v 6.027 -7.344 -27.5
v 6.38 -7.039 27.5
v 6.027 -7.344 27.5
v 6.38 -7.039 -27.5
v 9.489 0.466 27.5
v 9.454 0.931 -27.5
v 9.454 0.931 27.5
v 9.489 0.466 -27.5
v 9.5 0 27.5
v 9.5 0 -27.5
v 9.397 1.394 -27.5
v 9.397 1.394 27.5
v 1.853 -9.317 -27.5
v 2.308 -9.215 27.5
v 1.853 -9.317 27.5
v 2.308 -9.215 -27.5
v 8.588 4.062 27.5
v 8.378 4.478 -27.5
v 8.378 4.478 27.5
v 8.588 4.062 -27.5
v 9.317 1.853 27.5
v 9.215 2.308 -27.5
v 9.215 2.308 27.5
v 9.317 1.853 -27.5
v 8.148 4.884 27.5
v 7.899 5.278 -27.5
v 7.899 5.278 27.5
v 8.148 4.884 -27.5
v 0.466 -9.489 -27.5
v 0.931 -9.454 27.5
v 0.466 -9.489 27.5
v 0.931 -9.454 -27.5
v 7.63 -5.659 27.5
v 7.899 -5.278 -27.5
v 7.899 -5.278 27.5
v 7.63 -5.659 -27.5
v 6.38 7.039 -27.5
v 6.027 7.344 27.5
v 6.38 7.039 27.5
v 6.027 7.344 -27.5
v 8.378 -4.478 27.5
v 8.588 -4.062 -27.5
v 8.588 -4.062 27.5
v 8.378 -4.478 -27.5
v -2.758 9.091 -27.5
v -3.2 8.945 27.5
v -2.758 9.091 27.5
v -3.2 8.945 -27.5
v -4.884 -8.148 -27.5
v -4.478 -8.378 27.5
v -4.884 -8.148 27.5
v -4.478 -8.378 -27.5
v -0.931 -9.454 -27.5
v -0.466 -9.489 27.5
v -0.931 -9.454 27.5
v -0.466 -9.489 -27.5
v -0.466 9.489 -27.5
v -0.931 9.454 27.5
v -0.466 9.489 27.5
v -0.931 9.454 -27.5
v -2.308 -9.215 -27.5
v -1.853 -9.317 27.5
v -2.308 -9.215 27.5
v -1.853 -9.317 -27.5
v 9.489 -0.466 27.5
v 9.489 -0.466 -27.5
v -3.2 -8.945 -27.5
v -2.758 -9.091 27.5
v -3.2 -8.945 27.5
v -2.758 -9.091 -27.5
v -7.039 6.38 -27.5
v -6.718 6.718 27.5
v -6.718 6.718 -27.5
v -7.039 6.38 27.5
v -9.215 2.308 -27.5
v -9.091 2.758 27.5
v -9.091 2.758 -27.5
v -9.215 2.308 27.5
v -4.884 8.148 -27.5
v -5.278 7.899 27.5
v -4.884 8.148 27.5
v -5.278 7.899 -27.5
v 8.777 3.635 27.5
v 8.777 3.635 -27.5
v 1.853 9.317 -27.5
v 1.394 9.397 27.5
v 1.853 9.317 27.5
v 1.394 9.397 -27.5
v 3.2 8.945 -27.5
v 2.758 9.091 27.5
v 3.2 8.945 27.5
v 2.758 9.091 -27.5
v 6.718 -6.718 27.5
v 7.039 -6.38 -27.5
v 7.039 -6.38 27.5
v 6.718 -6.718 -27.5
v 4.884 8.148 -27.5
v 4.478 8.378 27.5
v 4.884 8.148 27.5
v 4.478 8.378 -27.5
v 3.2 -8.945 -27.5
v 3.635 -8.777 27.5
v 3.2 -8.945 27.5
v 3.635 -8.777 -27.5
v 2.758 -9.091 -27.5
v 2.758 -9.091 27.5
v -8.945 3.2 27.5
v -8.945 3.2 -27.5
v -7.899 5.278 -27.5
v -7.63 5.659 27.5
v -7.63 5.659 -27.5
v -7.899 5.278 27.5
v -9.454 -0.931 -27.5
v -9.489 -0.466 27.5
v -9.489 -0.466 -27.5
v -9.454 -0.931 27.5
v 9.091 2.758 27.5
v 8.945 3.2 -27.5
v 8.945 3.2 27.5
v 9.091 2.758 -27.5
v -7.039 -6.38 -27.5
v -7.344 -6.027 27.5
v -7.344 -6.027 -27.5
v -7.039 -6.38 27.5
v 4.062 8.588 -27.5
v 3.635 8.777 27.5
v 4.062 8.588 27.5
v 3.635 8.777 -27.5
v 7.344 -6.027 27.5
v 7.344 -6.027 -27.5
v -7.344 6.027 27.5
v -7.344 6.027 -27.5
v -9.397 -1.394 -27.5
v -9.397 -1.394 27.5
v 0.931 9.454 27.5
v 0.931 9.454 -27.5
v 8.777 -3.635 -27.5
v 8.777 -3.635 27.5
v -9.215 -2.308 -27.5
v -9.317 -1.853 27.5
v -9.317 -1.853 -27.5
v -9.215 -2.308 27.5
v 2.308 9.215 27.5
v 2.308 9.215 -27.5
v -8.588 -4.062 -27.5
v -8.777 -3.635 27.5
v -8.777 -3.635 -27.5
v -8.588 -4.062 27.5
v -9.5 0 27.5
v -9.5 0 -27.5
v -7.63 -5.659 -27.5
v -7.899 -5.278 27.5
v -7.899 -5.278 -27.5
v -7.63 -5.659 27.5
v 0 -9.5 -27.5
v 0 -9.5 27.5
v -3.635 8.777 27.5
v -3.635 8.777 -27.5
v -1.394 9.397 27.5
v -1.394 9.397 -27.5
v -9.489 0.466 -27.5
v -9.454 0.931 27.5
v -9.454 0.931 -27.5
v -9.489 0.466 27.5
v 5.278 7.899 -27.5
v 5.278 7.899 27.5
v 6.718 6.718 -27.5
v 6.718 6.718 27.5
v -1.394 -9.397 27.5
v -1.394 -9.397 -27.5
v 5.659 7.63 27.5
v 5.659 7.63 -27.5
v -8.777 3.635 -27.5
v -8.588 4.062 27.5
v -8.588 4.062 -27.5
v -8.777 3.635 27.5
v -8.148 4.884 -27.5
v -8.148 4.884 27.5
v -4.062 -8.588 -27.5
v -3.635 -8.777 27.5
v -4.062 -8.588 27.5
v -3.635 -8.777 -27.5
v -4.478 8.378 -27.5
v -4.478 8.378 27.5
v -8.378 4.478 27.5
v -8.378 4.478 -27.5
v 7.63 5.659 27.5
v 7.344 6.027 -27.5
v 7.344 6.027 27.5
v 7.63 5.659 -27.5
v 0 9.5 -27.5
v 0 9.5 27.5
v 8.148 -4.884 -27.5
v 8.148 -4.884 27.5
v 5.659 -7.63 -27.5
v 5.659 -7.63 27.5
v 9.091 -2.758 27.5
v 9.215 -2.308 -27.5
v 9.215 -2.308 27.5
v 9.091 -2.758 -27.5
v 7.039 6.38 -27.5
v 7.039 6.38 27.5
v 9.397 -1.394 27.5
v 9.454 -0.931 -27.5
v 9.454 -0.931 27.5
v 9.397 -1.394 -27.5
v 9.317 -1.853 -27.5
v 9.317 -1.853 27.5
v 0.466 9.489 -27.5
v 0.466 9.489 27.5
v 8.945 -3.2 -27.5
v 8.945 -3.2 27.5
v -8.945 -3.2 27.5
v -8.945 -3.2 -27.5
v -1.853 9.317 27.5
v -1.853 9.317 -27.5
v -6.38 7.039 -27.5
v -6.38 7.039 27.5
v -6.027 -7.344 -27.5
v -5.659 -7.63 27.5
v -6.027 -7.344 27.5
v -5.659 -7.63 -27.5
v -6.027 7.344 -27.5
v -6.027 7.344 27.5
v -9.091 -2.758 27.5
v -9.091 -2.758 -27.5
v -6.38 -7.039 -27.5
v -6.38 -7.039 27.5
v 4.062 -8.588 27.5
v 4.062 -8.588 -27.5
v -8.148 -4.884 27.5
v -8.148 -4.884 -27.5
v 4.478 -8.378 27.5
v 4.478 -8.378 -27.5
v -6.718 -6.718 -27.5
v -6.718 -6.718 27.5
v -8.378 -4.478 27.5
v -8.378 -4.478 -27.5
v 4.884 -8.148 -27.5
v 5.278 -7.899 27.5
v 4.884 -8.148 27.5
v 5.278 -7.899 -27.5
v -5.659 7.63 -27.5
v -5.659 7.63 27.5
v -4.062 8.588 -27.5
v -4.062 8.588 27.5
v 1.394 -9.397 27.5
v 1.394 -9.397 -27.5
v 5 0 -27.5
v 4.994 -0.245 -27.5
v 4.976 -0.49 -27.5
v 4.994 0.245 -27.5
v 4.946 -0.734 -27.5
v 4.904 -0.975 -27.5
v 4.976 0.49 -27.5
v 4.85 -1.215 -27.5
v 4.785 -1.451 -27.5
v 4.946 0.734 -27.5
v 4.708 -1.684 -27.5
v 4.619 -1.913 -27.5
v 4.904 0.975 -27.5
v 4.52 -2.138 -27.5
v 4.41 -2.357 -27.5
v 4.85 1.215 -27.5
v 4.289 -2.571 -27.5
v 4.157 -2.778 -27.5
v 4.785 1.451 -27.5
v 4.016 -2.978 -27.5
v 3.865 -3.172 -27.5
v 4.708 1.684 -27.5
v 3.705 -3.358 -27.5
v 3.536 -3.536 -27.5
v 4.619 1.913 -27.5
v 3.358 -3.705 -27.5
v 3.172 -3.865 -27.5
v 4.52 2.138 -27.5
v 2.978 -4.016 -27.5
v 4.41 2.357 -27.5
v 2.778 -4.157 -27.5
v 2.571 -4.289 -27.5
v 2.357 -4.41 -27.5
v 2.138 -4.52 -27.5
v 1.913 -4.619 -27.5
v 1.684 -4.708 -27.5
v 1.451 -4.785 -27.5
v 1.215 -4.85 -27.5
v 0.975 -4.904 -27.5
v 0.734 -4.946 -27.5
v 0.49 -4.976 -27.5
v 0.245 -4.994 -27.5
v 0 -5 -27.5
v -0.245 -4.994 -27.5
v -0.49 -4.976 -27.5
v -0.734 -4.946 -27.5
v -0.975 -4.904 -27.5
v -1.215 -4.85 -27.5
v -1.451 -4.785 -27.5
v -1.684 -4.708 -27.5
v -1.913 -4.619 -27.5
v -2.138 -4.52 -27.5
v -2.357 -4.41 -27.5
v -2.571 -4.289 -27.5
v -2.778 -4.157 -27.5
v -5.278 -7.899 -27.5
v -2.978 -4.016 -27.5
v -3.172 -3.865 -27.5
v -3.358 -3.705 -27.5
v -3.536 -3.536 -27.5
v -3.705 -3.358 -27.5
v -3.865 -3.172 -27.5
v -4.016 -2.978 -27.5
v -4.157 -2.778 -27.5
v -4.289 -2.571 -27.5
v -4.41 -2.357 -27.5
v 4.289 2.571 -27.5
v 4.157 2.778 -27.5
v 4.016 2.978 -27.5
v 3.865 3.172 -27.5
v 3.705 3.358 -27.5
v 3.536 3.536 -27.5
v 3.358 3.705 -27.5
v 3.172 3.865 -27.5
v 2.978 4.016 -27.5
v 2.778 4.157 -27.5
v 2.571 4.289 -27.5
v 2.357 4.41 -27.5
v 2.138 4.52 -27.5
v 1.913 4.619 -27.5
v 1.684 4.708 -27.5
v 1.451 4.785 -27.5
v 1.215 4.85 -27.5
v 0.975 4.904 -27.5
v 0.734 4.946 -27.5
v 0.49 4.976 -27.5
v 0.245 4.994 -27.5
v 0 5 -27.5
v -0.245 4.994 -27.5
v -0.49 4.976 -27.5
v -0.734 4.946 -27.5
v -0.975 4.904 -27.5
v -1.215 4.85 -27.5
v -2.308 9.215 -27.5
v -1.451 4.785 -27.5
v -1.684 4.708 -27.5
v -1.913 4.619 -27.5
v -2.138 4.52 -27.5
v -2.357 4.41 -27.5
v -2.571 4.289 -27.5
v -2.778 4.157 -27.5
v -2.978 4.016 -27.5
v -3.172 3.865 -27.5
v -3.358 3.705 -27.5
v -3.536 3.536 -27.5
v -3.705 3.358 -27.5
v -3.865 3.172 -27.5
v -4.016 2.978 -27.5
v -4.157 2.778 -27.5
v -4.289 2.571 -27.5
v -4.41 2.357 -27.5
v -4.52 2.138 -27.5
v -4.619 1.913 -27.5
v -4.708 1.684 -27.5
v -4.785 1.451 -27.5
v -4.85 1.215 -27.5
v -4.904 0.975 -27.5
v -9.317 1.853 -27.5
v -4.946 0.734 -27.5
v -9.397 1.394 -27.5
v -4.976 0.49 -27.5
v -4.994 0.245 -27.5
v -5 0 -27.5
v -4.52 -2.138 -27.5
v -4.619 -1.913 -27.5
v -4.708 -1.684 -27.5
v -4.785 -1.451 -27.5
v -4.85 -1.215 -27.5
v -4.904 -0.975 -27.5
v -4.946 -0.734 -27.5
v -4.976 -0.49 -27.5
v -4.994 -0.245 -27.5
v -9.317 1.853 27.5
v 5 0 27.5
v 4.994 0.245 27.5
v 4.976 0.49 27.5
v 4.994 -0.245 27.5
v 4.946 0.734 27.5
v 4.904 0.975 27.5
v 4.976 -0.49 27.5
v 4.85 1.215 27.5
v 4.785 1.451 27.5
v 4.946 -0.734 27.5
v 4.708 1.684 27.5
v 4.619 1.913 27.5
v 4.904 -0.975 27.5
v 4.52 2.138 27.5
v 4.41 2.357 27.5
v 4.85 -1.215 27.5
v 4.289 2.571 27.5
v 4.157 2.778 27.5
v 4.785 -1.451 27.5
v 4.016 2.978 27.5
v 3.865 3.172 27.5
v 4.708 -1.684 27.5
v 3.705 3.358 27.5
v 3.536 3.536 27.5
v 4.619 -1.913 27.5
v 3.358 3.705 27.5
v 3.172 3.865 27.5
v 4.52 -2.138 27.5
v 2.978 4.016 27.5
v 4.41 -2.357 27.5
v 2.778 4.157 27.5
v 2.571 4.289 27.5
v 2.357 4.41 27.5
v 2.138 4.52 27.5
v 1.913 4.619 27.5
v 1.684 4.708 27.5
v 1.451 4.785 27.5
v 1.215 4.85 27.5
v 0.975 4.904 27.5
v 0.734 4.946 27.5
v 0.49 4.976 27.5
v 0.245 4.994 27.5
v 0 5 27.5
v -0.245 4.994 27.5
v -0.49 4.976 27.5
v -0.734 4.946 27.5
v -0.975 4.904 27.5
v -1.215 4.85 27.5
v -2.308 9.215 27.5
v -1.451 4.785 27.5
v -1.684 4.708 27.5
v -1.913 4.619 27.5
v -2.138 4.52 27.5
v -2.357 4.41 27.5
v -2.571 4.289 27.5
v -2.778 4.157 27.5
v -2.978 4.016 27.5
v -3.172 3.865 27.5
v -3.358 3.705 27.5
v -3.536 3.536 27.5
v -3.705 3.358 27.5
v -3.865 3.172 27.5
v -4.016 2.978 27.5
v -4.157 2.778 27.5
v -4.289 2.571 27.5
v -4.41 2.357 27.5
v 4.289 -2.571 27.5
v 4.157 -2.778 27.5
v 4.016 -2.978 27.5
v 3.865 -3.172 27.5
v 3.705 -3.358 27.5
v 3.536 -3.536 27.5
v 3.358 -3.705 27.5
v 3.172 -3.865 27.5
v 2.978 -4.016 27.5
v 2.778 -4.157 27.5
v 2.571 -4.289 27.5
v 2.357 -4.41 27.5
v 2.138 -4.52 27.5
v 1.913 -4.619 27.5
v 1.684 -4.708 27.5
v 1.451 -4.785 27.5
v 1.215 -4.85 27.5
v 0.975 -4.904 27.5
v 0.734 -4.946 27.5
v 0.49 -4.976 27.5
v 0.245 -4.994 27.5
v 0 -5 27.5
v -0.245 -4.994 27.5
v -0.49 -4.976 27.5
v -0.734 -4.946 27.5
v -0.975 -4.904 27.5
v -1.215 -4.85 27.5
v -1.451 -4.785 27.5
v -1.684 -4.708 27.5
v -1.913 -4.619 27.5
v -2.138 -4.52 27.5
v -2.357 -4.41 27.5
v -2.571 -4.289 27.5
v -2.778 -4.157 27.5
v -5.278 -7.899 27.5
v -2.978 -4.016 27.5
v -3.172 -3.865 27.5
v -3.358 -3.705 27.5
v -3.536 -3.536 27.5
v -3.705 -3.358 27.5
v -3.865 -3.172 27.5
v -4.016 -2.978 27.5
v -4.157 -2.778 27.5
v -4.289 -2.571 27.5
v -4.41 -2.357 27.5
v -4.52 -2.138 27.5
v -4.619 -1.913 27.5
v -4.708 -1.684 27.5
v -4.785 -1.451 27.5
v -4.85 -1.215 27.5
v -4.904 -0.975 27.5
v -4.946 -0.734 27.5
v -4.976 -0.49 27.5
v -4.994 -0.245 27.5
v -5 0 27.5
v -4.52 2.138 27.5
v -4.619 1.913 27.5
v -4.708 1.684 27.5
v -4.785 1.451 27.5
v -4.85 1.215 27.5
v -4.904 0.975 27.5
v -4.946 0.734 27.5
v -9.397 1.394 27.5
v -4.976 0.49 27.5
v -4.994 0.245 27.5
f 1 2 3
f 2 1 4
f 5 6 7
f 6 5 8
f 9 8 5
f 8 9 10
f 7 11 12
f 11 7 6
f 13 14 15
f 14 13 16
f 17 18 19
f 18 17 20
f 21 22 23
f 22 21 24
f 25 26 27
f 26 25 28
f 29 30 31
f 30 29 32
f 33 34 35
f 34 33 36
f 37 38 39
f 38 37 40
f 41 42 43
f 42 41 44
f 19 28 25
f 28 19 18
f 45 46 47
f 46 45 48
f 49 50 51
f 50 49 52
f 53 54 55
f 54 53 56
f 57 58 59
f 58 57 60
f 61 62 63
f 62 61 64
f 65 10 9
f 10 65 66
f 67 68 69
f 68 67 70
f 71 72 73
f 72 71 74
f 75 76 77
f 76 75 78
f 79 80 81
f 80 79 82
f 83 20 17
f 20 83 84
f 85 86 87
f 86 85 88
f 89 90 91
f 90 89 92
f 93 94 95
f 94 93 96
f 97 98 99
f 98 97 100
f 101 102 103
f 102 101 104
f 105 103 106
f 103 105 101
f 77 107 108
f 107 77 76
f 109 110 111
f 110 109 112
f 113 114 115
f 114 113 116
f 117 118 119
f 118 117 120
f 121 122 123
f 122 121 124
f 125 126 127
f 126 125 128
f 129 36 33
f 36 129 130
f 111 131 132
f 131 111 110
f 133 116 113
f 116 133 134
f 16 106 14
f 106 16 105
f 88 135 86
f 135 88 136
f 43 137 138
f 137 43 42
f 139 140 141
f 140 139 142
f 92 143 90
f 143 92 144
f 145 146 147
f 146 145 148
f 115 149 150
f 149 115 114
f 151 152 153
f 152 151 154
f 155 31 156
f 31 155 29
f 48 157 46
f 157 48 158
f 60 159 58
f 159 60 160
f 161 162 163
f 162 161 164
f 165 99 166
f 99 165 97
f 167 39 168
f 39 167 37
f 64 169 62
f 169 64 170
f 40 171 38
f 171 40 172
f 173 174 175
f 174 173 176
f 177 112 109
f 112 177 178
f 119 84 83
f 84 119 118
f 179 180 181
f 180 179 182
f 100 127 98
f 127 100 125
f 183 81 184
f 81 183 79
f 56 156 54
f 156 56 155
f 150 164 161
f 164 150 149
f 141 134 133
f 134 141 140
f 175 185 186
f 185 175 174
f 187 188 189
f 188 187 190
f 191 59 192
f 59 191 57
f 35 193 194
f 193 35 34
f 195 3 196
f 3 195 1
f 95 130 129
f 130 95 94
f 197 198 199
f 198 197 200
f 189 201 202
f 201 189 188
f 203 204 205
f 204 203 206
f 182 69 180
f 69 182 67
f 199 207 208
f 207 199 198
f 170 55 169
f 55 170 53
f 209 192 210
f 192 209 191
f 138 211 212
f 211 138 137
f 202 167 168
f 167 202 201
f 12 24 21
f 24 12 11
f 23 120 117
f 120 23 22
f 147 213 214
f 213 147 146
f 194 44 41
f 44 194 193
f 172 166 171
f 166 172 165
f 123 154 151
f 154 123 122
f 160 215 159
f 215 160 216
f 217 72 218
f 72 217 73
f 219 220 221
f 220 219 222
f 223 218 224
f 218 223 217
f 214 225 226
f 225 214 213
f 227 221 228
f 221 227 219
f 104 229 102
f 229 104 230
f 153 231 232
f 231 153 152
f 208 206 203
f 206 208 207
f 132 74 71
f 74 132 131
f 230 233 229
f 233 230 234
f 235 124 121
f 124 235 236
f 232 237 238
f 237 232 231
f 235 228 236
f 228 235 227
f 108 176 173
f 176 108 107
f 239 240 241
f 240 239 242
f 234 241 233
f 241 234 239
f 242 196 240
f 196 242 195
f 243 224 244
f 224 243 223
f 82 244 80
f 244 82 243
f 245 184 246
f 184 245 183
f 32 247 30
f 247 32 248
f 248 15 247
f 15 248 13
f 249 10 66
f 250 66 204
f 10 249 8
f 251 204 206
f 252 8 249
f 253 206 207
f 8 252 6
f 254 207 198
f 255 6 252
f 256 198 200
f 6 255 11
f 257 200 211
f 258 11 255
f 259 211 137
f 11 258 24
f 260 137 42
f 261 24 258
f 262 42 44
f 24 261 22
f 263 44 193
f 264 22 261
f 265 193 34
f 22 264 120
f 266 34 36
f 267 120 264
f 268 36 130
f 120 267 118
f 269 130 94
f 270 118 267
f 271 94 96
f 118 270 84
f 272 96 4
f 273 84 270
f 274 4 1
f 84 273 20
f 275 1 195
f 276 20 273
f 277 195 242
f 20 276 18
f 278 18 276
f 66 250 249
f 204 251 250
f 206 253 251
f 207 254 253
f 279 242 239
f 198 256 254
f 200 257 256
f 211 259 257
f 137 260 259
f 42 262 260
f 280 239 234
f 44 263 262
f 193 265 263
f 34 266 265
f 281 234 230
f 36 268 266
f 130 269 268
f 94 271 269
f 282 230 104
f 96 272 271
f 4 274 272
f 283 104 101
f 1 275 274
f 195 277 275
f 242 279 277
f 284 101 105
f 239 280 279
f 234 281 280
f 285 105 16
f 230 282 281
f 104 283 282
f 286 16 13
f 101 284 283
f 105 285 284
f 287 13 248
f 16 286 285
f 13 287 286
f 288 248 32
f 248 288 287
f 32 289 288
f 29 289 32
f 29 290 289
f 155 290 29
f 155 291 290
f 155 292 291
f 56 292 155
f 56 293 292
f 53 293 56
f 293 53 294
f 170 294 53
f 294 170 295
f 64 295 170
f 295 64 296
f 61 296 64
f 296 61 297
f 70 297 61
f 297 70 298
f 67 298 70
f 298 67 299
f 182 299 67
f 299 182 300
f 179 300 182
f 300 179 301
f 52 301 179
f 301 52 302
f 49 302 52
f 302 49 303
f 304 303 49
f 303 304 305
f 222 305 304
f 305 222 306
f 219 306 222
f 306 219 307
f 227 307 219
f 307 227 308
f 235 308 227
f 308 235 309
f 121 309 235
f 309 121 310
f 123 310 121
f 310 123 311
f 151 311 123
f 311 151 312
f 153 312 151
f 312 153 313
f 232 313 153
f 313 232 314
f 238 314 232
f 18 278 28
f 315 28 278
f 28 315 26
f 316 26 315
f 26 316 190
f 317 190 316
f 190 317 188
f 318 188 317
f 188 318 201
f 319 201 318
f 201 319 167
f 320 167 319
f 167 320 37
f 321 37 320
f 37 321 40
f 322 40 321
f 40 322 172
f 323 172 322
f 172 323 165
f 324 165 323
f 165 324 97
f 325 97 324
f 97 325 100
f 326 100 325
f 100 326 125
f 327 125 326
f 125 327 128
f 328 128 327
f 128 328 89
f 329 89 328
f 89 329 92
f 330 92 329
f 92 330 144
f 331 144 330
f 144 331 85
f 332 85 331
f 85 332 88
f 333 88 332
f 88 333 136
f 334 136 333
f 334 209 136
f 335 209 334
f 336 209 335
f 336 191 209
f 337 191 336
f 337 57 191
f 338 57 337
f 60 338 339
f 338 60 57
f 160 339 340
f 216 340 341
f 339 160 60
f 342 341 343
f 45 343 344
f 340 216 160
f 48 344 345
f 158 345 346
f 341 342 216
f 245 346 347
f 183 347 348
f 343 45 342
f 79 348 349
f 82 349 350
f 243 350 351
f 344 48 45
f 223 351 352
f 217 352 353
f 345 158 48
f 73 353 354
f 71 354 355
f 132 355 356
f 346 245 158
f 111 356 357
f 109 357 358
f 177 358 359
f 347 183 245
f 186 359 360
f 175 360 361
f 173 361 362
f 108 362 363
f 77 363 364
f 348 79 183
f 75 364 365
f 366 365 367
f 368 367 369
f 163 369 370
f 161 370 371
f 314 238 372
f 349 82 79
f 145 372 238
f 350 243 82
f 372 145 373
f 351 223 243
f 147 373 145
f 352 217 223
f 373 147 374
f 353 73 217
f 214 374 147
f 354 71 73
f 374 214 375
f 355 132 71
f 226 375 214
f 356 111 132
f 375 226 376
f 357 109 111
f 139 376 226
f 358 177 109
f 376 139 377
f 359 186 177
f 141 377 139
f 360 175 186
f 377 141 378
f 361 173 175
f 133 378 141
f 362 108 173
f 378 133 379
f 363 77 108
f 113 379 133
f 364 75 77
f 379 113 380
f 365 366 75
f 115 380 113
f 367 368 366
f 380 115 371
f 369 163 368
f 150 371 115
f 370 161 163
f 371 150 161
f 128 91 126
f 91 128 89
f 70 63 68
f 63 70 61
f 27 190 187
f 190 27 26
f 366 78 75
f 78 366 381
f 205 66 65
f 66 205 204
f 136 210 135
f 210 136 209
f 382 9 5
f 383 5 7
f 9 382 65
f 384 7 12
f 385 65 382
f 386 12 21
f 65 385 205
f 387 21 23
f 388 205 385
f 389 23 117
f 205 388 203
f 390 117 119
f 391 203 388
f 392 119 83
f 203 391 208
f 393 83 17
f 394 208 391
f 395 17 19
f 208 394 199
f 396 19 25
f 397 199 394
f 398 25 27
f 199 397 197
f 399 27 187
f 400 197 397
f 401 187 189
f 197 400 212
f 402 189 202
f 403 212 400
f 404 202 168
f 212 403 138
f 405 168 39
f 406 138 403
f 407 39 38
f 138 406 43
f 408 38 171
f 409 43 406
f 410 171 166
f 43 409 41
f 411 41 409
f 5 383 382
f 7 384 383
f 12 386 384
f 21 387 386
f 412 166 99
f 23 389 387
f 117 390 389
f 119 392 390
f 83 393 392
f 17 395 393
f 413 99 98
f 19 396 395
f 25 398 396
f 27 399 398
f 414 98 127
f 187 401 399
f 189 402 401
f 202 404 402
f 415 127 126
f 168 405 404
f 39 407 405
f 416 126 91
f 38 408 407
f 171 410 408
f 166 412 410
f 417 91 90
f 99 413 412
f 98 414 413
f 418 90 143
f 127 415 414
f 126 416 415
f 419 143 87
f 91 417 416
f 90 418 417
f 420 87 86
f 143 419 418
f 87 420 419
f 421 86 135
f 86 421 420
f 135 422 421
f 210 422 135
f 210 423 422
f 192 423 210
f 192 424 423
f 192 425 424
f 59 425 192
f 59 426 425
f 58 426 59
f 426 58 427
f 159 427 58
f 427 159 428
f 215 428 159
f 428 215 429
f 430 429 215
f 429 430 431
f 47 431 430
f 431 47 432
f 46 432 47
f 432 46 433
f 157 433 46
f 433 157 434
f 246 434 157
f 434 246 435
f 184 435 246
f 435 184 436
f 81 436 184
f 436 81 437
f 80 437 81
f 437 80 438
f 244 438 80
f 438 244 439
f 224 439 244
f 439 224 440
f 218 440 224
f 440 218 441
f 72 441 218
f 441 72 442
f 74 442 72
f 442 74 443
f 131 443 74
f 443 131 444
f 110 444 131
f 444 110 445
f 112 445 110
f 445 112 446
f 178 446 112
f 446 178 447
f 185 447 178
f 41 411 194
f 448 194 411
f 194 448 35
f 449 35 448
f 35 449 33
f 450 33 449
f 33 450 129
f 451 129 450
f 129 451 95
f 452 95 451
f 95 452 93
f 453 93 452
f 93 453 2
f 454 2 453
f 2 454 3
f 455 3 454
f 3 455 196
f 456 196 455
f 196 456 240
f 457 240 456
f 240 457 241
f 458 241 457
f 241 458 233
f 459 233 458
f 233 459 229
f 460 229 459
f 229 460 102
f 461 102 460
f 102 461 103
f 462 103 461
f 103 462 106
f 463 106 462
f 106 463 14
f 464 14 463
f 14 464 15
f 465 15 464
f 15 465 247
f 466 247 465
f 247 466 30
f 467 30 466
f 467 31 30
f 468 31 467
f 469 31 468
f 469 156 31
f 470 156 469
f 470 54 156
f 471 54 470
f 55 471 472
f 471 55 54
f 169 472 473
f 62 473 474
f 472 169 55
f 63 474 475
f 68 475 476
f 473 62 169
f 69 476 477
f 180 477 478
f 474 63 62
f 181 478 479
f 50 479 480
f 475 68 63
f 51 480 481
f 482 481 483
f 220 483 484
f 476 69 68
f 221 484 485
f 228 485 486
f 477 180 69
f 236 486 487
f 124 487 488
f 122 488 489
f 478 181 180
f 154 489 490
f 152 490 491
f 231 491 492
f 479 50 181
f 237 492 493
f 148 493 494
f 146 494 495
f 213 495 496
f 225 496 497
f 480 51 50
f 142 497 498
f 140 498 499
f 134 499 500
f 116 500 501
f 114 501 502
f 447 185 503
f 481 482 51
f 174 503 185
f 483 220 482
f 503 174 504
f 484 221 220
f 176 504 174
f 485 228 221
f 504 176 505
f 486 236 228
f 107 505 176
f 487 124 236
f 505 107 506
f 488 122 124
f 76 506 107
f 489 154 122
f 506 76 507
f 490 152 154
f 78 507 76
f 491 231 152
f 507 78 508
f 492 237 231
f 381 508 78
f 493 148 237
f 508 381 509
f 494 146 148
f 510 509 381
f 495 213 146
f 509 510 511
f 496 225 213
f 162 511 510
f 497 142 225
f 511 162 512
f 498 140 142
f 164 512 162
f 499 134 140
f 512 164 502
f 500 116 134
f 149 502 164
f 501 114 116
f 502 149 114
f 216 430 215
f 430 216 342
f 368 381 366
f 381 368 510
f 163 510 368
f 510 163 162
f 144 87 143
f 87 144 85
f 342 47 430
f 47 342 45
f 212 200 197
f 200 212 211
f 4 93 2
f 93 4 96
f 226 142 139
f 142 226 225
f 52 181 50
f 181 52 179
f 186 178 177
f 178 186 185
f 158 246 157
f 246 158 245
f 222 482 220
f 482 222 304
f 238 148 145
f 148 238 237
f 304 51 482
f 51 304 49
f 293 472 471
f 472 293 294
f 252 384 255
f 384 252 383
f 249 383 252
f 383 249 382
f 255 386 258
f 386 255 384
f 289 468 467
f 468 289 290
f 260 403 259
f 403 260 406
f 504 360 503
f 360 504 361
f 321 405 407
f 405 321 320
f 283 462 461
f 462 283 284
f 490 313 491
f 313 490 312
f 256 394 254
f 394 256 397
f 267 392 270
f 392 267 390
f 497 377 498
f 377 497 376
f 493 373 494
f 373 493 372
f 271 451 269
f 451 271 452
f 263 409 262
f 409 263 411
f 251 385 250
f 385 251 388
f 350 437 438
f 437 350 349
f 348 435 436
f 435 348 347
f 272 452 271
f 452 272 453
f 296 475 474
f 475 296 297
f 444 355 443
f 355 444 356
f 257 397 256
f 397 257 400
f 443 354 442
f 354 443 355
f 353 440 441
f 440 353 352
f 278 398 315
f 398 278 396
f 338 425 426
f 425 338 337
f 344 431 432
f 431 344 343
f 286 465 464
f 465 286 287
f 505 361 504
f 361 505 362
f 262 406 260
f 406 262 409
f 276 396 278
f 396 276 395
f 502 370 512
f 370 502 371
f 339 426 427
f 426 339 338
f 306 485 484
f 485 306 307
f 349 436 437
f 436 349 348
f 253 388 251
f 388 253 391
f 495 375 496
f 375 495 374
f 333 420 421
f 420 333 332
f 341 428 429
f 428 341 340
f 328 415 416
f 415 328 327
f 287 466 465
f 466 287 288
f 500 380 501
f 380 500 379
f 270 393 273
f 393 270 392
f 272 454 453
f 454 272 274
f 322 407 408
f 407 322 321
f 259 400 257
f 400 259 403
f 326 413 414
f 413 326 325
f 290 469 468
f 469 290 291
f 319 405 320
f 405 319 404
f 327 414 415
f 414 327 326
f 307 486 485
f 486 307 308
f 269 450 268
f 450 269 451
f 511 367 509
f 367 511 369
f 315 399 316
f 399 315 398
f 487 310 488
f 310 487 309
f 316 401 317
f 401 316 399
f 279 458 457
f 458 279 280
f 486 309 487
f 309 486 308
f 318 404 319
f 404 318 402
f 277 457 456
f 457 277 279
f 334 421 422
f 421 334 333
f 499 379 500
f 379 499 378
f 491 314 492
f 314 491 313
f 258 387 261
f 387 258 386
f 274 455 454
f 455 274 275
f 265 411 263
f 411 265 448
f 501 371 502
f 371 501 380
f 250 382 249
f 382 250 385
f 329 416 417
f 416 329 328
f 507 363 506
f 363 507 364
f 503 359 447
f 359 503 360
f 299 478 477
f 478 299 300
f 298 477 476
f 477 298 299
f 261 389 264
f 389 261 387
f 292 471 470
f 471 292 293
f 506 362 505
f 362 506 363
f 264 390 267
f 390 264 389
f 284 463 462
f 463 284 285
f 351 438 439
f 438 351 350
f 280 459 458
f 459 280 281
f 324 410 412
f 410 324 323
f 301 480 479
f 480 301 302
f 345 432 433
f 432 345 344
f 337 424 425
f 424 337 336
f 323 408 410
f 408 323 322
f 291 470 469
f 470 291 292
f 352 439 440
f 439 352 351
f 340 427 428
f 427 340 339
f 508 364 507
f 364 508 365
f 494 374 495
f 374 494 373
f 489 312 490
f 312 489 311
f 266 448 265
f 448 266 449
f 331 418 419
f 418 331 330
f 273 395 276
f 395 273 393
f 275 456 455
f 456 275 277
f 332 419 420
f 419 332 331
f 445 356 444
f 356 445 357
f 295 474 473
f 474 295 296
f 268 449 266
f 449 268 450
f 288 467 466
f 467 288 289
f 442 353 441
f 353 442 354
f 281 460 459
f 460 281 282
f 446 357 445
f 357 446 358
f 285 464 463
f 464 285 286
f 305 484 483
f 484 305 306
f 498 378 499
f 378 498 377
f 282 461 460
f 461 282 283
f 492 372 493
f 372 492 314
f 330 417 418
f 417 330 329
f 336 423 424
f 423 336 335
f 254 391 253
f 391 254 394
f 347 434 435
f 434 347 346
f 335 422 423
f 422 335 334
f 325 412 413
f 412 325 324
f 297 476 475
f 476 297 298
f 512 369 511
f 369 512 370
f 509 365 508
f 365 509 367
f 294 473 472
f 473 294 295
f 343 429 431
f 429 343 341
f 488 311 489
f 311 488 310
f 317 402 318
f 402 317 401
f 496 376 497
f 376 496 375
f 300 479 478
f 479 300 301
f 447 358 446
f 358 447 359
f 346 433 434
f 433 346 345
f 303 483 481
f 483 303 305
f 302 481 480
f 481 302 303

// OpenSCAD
// Long Linear Bearing (standalone)
// Specs: 10.0mm bore, 19.0mm outer diameter, 55.0mm length

$fn = 128;

// Parameters
bore_diameter_mm  = 10.0;
outer_diameter_mm = 19.0;
length_mm         = 55.0;

overlap_mm = 0.2; // small overlap to ensure clean boolean operations

module long_linear_bearing() {
    difference() {
        // Outer continuous cylindrical surface
        cylinder(d = outer_diameter_mm, h = length_mm, center = true);

        // Through-bore
        cylinder(d = bore_diameter_mm, h = length_mm + 2*overlap_mm, center = true);
    }
}

long_linear_bearing();
